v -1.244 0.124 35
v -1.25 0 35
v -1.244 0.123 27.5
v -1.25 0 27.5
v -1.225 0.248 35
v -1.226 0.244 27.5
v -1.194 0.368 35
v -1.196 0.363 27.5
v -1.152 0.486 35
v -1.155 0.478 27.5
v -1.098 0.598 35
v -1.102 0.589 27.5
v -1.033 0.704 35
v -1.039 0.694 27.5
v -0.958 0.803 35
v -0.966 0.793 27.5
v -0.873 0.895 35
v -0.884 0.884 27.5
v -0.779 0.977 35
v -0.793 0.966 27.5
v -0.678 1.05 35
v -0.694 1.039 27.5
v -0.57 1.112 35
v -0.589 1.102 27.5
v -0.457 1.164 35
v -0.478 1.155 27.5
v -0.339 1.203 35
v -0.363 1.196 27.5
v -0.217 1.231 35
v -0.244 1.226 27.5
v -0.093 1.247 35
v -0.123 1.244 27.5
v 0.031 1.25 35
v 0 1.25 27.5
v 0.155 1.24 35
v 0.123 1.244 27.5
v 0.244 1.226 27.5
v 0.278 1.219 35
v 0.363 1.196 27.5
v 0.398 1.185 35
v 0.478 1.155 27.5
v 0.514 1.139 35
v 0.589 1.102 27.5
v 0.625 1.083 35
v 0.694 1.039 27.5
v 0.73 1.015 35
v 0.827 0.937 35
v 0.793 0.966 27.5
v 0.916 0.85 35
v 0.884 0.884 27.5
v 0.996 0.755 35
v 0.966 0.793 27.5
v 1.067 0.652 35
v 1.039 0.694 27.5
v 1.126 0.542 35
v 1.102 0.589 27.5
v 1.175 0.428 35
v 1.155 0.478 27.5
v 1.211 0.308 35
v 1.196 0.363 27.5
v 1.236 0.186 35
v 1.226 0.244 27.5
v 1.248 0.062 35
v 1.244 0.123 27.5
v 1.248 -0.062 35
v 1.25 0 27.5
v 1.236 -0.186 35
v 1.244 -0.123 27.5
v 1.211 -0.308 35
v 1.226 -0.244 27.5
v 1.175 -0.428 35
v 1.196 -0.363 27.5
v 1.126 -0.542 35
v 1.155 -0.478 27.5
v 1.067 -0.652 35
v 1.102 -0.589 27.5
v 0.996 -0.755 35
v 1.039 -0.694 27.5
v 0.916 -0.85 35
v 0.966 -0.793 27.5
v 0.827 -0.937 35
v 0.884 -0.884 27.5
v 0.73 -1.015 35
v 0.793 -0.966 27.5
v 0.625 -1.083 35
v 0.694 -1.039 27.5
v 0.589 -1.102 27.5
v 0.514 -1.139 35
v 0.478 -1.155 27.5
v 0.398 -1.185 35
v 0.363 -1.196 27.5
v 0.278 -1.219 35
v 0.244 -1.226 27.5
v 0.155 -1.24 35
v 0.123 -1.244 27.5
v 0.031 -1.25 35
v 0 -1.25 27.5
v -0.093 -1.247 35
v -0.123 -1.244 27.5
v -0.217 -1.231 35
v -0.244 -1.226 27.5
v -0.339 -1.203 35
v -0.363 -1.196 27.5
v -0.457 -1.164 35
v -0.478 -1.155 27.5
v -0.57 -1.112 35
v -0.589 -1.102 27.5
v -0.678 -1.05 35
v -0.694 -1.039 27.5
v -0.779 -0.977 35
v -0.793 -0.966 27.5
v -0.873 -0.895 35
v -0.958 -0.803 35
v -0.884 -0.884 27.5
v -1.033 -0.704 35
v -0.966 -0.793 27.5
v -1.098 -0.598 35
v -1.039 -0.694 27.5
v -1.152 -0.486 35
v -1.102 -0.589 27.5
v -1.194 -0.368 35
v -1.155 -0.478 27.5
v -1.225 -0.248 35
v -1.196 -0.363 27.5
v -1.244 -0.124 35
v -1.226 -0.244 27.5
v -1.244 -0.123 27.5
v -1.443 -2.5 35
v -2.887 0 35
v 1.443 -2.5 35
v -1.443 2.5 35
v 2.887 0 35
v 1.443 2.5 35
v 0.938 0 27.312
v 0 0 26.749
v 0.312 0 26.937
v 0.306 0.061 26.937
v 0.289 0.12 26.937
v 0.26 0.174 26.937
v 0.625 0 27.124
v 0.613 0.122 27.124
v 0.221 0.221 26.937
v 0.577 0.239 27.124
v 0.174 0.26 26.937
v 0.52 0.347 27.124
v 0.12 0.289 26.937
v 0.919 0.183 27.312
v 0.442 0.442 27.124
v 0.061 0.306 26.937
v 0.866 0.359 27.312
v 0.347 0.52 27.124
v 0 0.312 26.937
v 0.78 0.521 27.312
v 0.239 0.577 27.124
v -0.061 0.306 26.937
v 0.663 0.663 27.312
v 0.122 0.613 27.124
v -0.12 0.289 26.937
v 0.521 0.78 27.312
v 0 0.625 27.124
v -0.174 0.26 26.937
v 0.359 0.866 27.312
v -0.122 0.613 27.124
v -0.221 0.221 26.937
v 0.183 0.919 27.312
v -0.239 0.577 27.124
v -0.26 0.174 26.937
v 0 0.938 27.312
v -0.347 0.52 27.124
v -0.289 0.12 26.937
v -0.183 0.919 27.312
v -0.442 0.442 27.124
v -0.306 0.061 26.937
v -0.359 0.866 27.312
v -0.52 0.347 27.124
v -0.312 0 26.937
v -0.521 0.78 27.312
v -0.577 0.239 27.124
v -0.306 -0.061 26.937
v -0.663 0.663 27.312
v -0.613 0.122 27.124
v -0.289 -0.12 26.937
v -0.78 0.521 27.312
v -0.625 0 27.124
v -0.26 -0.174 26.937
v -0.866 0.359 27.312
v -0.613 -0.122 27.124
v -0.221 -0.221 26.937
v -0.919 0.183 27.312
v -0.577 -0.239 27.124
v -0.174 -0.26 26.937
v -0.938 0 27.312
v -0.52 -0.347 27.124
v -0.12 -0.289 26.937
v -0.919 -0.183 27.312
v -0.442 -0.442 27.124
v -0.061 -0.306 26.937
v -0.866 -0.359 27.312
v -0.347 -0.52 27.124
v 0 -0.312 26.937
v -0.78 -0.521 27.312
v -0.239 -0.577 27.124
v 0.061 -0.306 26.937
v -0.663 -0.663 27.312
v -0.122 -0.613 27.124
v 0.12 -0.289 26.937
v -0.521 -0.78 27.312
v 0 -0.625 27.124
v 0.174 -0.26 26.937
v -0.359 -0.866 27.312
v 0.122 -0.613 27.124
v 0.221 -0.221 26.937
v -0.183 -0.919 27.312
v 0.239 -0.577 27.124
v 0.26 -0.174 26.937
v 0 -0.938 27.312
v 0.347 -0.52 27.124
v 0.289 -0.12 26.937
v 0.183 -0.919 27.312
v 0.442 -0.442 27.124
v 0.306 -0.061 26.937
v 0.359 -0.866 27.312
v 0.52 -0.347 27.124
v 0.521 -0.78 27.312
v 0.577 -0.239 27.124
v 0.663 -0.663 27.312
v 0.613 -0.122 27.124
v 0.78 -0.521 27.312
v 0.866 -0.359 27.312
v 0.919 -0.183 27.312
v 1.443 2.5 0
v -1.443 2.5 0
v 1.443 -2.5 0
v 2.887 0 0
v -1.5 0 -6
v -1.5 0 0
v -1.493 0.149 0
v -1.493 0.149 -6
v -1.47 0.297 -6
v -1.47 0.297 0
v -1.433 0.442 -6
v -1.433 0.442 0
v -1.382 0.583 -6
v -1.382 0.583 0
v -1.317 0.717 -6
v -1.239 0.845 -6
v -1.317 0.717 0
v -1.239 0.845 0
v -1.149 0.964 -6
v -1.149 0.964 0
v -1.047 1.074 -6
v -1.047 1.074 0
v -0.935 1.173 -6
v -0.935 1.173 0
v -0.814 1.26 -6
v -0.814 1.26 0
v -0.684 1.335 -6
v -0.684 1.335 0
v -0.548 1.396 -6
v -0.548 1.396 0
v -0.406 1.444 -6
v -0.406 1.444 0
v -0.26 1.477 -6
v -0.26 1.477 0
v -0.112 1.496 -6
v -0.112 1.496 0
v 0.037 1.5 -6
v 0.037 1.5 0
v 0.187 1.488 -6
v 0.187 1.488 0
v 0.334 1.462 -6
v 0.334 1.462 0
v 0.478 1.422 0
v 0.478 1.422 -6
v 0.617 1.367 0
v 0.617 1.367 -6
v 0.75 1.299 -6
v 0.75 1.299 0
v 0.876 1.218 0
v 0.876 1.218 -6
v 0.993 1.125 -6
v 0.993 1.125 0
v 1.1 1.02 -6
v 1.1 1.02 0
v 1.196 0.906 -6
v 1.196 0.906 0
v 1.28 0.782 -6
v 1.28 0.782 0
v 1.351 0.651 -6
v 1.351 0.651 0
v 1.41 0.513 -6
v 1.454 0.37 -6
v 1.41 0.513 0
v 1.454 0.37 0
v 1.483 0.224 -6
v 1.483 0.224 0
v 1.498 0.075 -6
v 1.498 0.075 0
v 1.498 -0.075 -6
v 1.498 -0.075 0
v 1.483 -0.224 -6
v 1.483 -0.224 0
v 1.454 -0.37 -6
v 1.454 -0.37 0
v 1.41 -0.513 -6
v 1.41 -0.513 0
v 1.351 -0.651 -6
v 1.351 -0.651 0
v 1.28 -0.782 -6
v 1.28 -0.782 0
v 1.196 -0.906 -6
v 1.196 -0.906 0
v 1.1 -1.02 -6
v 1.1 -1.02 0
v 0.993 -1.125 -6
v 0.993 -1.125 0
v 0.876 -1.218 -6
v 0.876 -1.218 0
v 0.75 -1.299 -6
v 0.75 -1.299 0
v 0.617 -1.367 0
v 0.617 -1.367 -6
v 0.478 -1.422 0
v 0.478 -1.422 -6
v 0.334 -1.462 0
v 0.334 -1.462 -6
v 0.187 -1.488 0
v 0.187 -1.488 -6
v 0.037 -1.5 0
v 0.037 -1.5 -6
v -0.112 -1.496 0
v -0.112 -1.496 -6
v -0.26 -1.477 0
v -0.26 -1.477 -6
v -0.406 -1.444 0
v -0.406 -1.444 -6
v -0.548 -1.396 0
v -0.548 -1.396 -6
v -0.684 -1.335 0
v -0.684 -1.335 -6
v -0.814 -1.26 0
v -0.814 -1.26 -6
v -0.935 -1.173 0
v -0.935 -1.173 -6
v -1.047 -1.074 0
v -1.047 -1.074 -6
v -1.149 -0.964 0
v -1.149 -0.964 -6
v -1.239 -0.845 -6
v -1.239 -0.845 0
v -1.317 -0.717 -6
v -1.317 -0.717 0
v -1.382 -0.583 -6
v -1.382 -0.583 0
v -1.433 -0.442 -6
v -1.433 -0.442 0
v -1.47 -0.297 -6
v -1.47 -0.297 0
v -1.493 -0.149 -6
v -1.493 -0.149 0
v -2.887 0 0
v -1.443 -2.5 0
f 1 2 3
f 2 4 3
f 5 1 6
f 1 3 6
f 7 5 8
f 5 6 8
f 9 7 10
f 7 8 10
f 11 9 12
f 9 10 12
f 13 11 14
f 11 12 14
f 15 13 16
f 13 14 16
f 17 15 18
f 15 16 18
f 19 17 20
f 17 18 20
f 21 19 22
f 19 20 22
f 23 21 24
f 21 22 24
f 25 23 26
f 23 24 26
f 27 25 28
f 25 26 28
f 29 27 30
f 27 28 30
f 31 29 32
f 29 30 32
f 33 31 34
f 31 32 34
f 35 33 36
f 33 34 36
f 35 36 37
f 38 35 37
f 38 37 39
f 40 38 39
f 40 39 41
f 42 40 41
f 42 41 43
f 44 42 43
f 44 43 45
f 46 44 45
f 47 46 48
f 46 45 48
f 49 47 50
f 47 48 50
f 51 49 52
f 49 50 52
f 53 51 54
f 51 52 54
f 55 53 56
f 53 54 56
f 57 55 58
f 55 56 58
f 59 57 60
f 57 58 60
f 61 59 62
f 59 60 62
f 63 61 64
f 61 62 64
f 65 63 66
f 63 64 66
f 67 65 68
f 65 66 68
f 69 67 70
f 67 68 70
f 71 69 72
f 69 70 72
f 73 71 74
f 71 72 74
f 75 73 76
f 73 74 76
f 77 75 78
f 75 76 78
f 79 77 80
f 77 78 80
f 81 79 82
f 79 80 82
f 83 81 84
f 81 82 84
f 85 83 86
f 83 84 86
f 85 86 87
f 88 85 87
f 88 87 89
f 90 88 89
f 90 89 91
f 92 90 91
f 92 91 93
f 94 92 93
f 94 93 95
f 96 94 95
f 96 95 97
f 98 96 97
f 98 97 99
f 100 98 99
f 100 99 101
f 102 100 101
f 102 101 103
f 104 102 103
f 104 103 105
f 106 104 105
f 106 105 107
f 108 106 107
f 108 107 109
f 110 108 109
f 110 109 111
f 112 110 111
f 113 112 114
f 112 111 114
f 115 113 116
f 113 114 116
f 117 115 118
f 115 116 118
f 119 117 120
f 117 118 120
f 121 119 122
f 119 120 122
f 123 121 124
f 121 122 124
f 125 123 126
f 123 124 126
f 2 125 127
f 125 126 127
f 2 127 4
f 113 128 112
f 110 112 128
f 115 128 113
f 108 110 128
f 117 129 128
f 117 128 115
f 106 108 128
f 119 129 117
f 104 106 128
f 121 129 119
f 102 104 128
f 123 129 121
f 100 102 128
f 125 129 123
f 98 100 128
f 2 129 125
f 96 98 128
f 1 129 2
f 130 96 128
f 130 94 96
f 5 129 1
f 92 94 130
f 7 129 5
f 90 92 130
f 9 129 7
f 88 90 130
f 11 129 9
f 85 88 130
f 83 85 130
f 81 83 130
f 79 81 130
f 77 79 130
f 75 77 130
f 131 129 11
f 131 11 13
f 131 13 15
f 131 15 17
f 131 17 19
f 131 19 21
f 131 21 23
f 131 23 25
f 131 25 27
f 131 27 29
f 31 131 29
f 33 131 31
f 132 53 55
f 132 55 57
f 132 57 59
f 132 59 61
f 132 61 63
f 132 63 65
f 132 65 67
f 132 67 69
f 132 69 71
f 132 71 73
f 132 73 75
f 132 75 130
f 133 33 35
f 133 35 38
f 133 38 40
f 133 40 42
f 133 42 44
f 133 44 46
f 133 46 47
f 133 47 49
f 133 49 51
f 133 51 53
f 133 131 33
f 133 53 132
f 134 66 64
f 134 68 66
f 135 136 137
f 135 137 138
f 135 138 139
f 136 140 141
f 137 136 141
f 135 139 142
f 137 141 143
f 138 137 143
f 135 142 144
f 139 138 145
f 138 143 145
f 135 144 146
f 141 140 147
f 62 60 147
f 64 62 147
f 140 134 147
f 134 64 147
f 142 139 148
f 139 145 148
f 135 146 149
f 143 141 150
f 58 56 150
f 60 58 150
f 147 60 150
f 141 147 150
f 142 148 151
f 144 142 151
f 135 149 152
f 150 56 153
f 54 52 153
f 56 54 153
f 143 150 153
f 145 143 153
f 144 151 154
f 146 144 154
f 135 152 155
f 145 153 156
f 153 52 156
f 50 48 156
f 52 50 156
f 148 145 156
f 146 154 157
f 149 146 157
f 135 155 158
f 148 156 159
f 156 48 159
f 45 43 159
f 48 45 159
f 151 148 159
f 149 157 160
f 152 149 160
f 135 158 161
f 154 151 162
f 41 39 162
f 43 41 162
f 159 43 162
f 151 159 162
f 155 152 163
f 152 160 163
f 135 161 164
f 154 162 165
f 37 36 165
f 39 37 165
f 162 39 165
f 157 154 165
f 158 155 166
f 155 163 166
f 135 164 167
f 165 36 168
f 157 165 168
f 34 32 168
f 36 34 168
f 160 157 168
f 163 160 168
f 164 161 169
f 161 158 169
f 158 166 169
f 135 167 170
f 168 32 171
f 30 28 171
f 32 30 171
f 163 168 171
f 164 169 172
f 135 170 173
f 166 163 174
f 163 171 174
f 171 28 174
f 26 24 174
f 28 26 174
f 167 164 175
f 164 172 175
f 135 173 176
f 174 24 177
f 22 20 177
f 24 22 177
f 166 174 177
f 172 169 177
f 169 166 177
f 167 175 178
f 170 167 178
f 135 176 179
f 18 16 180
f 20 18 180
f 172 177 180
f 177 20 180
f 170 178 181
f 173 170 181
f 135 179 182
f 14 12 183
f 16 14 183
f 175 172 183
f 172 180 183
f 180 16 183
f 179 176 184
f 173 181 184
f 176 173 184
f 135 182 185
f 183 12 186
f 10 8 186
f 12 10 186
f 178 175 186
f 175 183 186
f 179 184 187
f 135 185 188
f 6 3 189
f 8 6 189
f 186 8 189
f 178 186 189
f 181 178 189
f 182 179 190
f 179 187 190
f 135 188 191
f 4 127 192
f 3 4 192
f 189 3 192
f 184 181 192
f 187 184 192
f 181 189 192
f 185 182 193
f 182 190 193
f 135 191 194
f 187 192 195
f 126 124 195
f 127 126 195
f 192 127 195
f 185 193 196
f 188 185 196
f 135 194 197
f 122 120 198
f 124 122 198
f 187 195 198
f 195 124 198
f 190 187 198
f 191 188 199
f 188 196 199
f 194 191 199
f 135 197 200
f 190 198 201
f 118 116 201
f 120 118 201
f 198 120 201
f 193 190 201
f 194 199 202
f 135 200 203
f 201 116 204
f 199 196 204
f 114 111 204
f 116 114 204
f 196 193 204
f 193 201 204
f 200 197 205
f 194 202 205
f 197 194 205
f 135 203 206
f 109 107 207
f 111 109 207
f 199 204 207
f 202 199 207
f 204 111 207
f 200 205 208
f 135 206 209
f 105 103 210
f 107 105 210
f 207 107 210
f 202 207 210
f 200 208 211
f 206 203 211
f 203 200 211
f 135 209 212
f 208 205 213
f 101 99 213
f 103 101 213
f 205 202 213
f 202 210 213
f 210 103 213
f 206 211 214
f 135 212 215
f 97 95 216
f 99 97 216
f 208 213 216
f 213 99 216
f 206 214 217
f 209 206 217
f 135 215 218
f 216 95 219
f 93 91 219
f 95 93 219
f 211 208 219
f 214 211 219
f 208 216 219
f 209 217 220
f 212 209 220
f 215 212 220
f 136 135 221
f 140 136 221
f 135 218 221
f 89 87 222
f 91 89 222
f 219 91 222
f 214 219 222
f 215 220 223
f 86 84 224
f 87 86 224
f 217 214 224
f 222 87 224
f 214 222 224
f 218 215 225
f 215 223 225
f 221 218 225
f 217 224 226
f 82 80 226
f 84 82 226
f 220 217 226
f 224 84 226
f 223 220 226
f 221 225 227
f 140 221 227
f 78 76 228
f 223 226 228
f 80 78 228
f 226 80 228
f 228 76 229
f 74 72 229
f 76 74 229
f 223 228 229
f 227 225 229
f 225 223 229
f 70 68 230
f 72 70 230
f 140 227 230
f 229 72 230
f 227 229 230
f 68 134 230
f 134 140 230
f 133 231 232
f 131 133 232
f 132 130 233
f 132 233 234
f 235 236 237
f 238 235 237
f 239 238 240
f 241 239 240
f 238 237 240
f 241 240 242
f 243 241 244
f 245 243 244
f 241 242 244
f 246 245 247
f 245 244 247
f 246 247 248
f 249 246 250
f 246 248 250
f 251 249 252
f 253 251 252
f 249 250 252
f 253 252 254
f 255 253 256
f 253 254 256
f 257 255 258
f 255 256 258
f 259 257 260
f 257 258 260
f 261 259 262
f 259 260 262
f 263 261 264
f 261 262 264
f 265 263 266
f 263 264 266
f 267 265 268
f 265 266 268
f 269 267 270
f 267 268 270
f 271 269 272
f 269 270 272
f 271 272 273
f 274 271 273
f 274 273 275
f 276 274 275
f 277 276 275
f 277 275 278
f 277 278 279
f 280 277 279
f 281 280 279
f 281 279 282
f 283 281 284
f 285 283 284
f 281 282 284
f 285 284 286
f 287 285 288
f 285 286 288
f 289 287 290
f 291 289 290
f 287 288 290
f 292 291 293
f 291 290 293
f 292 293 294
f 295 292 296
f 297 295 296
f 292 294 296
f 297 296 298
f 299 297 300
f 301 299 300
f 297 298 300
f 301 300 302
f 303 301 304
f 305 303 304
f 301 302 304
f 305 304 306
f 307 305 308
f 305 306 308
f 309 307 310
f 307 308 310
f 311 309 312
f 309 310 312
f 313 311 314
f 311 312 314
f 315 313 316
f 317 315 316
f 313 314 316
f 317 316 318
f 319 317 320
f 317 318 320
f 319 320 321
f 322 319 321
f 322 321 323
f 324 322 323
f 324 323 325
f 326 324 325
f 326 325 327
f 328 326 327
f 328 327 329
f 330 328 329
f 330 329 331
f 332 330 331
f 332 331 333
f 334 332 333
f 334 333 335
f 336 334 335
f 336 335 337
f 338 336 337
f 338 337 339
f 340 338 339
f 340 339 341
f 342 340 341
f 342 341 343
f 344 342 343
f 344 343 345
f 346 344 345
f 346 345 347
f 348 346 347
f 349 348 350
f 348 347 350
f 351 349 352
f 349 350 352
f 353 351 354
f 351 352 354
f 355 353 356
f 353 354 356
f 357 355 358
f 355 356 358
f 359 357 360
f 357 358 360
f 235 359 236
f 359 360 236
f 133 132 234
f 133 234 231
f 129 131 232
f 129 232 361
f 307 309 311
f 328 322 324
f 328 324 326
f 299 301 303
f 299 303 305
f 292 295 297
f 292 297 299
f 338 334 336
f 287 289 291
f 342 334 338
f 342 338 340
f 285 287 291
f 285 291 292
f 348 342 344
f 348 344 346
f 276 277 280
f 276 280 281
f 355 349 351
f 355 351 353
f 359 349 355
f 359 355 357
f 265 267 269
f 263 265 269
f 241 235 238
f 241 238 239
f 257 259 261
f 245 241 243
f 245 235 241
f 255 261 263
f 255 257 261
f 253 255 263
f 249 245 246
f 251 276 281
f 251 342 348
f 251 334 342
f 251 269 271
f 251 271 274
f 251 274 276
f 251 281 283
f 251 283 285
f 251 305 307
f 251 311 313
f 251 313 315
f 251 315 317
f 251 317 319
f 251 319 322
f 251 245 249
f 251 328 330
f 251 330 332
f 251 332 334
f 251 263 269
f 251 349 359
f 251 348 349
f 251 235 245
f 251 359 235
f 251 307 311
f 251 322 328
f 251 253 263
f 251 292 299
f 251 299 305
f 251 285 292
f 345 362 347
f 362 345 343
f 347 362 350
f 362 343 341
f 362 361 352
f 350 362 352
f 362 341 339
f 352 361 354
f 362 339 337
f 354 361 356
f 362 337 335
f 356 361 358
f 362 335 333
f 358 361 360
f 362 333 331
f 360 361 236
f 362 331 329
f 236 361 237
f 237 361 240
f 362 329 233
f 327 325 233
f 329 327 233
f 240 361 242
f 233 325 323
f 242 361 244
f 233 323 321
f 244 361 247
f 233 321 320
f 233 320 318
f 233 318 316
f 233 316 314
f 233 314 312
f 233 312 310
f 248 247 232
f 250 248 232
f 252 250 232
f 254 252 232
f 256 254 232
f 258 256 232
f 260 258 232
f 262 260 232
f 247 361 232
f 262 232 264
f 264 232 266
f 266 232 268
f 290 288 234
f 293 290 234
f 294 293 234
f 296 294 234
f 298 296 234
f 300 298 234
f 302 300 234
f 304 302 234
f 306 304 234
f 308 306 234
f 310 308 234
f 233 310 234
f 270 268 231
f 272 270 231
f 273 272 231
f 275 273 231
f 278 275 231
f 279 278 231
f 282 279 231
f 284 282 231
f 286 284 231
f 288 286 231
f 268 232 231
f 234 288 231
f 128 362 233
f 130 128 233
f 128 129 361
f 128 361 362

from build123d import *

# Parameters (mm, degrees)
EXTRUDE_1_DEPTH = 35
SKETCH_4_R      = 1.5
EXTRUDE_2_DEPTH = 6
M3X0_5_1_D      = 2.5
M3X0_5_1_DEPTH  = 7.5
M3X0_5_1_TIP    = 0.751075774


with BuildPart() as part:
    # 草圖1 → 填料-伸長1 (new body)
    with BuildSketch(Plane.XY):
        Polygon((-1.443375673, 2.5), (-2.886751346, 0), (-1.443375673, -2.5), (1.443375673, -2.5), (2.886751346, 0), (1.443375673, 2.5), align=None)
    extrude(amount=EXTRUDE_1_DEPTH)

    # 草圖4 → 填料-伸長2 (add)
    with BuildSketch(Plane(origin=(0, 0, 0), x_dir=(-1, 0, 0), z_dir=(0, 0, -1))):
        Circle(SKETCH_4_R)
    extrude(amount=EXTRUDE_2_DEPTH)

    # M3x0.5 螺紋孔1
    with Locations(Plane.XY.offset(35)):
        with Locations((0, 0)):
            Hole(M3X0_5_1_D / 2, depth=M3X0_5_1_DEPTH)
            with Locations((0, 0, -(M3X0_5_1_DEPTH + M3X0_5_1_TIP / 2))):  # 118° drill point
                Cone(0, M3X0_5_1_D / 2, M3X0_5_1_TIP, mode=Mode.SUBTRACT)


solid = part.part
